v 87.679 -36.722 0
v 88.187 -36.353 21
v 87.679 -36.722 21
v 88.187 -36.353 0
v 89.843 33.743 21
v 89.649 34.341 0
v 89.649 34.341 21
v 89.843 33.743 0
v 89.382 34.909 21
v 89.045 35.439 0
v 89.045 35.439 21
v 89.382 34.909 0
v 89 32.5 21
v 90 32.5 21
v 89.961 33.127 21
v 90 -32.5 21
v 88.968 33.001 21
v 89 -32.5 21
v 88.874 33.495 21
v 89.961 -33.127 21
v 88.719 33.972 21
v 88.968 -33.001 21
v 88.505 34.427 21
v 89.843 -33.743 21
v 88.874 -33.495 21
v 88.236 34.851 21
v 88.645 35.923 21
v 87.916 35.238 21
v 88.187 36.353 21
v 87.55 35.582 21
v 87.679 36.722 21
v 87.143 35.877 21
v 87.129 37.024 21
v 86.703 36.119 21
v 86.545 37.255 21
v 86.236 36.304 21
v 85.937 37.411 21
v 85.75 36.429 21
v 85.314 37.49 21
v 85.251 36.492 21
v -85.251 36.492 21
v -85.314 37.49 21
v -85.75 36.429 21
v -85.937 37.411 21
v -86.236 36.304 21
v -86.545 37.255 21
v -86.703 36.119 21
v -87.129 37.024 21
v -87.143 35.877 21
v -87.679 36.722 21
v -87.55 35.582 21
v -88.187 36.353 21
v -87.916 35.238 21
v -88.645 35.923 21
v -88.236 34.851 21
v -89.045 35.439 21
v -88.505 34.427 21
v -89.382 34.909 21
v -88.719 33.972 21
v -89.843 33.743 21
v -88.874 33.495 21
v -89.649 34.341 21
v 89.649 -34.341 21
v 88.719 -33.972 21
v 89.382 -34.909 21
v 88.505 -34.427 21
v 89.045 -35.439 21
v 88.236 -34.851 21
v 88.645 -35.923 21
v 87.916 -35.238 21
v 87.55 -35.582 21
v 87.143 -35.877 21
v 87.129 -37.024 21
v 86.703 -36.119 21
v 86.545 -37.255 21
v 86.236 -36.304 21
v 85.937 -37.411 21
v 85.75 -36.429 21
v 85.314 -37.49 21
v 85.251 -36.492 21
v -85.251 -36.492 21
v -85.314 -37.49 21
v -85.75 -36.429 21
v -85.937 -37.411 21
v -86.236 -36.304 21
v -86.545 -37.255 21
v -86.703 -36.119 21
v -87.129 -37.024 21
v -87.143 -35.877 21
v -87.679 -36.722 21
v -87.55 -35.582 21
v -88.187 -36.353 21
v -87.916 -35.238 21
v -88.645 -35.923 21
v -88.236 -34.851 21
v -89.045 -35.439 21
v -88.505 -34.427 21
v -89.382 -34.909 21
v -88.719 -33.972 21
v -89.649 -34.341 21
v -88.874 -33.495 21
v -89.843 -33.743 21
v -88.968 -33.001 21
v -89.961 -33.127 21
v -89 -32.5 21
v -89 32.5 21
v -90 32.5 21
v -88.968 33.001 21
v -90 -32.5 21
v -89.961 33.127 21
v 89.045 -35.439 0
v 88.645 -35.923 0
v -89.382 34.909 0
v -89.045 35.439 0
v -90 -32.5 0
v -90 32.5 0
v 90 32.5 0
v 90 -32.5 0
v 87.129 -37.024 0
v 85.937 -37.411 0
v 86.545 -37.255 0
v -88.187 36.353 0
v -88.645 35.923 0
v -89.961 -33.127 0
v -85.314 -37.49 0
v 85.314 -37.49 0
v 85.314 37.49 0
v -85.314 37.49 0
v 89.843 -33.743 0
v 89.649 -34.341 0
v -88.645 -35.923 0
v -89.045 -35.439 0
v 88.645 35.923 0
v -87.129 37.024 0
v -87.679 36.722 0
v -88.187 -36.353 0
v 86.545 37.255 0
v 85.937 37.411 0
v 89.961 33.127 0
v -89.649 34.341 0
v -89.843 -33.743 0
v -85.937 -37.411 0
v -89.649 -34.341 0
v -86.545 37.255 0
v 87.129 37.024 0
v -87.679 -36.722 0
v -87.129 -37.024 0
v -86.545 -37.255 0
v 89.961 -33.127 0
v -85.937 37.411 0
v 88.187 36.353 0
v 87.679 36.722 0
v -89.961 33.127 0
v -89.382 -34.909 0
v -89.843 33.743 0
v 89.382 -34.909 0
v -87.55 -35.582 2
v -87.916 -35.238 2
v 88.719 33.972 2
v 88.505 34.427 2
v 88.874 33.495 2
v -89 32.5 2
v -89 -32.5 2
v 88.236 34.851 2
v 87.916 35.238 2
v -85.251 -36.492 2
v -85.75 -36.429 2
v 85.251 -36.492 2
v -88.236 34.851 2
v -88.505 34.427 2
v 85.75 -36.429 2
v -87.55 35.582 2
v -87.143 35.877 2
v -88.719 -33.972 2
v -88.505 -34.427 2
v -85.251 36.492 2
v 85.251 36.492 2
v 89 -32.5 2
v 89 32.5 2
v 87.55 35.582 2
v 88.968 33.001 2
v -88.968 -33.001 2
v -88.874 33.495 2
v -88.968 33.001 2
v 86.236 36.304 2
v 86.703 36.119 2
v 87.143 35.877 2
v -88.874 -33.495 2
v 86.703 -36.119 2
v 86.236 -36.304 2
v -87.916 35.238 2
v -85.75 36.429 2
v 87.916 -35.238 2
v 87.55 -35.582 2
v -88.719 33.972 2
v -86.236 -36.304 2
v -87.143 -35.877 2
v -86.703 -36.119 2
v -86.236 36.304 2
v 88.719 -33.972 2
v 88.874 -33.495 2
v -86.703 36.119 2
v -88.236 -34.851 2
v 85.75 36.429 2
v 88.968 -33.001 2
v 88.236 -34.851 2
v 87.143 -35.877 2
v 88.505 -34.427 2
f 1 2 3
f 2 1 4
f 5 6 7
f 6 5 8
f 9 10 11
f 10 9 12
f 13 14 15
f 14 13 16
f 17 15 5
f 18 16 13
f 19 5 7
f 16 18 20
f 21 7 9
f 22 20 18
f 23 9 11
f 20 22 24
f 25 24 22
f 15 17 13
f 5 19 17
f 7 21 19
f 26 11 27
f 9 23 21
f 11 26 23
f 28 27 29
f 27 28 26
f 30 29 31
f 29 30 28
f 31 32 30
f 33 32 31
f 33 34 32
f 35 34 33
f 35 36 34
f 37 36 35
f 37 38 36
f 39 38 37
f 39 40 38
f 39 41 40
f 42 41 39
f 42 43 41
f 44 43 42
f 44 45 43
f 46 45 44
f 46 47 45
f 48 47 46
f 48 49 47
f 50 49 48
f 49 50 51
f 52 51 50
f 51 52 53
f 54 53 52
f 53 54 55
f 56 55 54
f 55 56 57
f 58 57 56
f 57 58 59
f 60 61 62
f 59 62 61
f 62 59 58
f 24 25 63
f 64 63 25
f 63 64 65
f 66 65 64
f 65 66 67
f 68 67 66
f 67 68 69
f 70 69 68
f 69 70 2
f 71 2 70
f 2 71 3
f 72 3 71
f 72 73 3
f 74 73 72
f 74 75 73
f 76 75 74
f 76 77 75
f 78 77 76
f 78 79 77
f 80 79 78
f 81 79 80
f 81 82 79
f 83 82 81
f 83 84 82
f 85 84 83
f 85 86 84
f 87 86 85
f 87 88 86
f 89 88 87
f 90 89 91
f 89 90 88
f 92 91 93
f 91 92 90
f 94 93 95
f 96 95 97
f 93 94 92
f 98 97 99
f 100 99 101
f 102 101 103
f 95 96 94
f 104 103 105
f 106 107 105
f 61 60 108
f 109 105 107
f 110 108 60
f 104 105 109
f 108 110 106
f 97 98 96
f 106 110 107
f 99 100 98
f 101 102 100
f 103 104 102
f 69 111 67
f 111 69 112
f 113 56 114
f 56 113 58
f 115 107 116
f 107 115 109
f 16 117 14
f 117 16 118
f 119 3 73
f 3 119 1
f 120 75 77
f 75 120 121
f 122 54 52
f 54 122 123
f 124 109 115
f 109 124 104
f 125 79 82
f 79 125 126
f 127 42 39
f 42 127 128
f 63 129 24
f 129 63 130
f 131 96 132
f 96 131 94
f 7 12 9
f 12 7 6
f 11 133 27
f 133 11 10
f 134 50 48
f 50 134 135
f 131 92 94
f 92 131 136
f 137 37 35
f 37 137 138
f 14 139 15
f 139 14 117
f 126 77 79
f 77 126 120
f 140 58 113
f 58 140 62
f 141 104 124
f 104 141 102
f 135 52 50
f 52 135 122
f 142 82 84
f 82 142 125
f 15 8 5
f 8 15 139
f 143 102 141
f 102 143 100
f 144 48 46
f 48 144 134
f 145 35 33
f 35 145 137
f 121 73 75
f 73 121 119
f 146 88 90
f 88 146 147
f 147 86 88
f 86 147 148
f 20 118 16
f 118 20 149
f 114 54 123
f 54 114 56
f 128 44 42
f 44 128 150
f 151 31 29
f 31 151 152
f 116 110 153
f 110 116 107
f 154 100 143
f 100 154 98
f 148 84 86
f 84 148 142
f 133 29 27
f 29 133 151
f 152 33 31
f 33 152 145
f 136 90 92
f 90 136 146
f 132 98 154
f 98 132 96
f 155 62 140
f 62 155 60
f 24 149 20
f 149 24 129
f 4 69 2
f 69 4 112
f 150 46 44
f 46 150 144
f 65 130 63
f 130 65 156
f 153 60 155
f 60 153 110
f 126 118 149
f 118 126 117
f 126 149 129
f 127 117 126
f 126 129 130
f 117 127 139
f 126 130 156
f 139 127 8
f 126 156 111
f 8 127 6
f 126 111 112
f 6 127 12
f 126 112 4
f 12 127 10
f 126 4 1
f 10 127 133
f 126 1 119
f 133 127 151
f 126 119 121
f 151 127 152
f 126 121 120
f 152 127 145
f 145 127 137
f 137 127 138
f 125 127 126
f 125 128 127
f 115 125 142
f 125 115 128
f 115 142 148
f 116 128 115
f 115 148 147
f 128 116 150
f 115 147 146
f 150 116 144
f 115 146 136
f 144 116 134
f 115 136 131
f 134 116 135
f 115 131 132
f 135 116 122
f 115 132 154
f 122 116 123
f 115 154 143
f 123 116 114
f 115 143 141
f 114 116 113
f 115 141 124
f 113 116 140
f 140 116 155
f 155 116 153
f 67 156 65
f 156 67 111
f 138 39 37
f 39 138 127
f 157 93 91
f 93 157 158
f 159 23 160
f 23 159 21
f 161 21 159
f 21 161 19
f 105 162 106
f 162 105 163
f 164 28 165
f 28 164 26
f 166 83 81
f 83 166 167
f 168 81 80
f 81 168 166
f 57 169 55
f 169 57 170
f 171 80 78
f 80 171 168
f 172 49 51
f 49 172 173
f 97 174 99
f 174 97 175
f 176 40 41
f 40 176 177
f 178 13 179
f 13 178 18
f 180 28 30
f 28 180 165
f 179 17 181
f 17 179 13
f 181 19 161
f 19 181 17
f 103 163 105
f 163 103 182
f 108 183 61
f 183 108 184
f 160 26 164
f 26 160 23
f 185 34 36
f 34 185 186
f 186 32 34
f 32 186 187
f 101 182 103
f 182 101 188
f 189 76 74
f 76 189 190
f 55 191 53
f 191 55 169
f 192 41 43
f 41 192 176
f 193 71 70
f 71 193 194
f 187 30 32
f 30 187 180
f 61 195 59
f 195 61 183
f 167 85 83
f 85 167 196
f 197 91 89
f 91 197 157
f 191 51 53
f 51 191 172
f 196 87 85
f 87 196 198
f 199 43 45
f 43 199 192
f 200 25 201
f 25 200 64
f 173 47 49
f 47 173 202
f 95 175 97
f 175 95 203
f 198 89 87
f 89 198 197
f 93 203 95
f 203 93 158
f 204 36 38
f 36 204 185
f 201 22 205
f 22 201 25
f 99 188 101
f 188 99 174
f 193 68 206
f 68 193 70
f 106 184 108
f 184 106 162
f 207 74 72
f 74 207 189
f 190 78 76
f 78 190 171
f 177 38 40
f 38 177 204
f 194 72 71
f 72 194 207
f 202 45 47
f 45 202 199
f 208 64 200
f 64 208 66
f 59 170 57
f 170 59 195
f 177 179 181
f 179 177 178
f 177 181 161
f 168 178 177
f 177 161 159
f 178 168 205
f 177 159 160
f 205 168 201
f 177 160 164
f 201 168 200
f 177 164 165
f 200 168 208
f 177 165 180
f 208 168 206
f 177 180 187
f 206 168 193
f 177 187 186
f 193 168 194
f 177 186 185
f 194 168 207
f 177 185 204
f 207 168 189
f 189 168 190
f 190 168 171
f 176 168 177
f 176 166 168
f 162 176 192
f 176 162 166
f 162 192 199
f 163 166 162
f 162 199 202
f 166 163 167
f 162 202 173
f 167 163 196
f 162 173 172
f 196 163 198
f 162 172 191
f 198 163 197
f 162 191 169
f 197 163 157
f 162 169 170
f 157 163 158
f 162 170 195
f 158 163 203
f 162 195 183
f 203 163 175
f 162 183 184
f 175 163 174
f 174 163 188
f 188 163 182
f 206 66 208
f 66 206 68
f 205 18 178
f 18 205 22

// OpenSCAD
$fn = 50;


difference() {
	union() {
		hull() {
			translate(v = [-85.0000000000, 32.5000000000, 0]) {
				cylinder(h = 21, r = 5);
			}
			translate(v = [85.0000000000, 32.5000000000, 0]) {
				cylinder(h = 21, r = 5);
			}
			translate(v = [-85.0000000000, -32.5000000000, 0]) {
				cylinder(h = 21, r = 5);
			}
			translate(v = [85.0000000000, -32.5000000000, 0]) {
				cylinder(h = 21, r = 5);
			}
		}
	}
	union() {
		translate(v = [0, 0, 2]) {
			hull() {
				translate(v = [-85.0000000000, 32.5000000000, 0]) {
					cylinder(h = 19, r = 4);
				}
				translate(v = [85.0000000000, 32.5000000000, 0]) {
					cylinder(h = 19, r = 4);
				}
				translate(v = [-85.0000000000, -32.5000000000, 0]) {
					cylinder(h = 19, r = 4);
				}
				translate(v = [85.0000000000, -32.5000000000, 0]) {
					cylinder(h = 19, r = 4);
				}
			}
		}
	}
}
